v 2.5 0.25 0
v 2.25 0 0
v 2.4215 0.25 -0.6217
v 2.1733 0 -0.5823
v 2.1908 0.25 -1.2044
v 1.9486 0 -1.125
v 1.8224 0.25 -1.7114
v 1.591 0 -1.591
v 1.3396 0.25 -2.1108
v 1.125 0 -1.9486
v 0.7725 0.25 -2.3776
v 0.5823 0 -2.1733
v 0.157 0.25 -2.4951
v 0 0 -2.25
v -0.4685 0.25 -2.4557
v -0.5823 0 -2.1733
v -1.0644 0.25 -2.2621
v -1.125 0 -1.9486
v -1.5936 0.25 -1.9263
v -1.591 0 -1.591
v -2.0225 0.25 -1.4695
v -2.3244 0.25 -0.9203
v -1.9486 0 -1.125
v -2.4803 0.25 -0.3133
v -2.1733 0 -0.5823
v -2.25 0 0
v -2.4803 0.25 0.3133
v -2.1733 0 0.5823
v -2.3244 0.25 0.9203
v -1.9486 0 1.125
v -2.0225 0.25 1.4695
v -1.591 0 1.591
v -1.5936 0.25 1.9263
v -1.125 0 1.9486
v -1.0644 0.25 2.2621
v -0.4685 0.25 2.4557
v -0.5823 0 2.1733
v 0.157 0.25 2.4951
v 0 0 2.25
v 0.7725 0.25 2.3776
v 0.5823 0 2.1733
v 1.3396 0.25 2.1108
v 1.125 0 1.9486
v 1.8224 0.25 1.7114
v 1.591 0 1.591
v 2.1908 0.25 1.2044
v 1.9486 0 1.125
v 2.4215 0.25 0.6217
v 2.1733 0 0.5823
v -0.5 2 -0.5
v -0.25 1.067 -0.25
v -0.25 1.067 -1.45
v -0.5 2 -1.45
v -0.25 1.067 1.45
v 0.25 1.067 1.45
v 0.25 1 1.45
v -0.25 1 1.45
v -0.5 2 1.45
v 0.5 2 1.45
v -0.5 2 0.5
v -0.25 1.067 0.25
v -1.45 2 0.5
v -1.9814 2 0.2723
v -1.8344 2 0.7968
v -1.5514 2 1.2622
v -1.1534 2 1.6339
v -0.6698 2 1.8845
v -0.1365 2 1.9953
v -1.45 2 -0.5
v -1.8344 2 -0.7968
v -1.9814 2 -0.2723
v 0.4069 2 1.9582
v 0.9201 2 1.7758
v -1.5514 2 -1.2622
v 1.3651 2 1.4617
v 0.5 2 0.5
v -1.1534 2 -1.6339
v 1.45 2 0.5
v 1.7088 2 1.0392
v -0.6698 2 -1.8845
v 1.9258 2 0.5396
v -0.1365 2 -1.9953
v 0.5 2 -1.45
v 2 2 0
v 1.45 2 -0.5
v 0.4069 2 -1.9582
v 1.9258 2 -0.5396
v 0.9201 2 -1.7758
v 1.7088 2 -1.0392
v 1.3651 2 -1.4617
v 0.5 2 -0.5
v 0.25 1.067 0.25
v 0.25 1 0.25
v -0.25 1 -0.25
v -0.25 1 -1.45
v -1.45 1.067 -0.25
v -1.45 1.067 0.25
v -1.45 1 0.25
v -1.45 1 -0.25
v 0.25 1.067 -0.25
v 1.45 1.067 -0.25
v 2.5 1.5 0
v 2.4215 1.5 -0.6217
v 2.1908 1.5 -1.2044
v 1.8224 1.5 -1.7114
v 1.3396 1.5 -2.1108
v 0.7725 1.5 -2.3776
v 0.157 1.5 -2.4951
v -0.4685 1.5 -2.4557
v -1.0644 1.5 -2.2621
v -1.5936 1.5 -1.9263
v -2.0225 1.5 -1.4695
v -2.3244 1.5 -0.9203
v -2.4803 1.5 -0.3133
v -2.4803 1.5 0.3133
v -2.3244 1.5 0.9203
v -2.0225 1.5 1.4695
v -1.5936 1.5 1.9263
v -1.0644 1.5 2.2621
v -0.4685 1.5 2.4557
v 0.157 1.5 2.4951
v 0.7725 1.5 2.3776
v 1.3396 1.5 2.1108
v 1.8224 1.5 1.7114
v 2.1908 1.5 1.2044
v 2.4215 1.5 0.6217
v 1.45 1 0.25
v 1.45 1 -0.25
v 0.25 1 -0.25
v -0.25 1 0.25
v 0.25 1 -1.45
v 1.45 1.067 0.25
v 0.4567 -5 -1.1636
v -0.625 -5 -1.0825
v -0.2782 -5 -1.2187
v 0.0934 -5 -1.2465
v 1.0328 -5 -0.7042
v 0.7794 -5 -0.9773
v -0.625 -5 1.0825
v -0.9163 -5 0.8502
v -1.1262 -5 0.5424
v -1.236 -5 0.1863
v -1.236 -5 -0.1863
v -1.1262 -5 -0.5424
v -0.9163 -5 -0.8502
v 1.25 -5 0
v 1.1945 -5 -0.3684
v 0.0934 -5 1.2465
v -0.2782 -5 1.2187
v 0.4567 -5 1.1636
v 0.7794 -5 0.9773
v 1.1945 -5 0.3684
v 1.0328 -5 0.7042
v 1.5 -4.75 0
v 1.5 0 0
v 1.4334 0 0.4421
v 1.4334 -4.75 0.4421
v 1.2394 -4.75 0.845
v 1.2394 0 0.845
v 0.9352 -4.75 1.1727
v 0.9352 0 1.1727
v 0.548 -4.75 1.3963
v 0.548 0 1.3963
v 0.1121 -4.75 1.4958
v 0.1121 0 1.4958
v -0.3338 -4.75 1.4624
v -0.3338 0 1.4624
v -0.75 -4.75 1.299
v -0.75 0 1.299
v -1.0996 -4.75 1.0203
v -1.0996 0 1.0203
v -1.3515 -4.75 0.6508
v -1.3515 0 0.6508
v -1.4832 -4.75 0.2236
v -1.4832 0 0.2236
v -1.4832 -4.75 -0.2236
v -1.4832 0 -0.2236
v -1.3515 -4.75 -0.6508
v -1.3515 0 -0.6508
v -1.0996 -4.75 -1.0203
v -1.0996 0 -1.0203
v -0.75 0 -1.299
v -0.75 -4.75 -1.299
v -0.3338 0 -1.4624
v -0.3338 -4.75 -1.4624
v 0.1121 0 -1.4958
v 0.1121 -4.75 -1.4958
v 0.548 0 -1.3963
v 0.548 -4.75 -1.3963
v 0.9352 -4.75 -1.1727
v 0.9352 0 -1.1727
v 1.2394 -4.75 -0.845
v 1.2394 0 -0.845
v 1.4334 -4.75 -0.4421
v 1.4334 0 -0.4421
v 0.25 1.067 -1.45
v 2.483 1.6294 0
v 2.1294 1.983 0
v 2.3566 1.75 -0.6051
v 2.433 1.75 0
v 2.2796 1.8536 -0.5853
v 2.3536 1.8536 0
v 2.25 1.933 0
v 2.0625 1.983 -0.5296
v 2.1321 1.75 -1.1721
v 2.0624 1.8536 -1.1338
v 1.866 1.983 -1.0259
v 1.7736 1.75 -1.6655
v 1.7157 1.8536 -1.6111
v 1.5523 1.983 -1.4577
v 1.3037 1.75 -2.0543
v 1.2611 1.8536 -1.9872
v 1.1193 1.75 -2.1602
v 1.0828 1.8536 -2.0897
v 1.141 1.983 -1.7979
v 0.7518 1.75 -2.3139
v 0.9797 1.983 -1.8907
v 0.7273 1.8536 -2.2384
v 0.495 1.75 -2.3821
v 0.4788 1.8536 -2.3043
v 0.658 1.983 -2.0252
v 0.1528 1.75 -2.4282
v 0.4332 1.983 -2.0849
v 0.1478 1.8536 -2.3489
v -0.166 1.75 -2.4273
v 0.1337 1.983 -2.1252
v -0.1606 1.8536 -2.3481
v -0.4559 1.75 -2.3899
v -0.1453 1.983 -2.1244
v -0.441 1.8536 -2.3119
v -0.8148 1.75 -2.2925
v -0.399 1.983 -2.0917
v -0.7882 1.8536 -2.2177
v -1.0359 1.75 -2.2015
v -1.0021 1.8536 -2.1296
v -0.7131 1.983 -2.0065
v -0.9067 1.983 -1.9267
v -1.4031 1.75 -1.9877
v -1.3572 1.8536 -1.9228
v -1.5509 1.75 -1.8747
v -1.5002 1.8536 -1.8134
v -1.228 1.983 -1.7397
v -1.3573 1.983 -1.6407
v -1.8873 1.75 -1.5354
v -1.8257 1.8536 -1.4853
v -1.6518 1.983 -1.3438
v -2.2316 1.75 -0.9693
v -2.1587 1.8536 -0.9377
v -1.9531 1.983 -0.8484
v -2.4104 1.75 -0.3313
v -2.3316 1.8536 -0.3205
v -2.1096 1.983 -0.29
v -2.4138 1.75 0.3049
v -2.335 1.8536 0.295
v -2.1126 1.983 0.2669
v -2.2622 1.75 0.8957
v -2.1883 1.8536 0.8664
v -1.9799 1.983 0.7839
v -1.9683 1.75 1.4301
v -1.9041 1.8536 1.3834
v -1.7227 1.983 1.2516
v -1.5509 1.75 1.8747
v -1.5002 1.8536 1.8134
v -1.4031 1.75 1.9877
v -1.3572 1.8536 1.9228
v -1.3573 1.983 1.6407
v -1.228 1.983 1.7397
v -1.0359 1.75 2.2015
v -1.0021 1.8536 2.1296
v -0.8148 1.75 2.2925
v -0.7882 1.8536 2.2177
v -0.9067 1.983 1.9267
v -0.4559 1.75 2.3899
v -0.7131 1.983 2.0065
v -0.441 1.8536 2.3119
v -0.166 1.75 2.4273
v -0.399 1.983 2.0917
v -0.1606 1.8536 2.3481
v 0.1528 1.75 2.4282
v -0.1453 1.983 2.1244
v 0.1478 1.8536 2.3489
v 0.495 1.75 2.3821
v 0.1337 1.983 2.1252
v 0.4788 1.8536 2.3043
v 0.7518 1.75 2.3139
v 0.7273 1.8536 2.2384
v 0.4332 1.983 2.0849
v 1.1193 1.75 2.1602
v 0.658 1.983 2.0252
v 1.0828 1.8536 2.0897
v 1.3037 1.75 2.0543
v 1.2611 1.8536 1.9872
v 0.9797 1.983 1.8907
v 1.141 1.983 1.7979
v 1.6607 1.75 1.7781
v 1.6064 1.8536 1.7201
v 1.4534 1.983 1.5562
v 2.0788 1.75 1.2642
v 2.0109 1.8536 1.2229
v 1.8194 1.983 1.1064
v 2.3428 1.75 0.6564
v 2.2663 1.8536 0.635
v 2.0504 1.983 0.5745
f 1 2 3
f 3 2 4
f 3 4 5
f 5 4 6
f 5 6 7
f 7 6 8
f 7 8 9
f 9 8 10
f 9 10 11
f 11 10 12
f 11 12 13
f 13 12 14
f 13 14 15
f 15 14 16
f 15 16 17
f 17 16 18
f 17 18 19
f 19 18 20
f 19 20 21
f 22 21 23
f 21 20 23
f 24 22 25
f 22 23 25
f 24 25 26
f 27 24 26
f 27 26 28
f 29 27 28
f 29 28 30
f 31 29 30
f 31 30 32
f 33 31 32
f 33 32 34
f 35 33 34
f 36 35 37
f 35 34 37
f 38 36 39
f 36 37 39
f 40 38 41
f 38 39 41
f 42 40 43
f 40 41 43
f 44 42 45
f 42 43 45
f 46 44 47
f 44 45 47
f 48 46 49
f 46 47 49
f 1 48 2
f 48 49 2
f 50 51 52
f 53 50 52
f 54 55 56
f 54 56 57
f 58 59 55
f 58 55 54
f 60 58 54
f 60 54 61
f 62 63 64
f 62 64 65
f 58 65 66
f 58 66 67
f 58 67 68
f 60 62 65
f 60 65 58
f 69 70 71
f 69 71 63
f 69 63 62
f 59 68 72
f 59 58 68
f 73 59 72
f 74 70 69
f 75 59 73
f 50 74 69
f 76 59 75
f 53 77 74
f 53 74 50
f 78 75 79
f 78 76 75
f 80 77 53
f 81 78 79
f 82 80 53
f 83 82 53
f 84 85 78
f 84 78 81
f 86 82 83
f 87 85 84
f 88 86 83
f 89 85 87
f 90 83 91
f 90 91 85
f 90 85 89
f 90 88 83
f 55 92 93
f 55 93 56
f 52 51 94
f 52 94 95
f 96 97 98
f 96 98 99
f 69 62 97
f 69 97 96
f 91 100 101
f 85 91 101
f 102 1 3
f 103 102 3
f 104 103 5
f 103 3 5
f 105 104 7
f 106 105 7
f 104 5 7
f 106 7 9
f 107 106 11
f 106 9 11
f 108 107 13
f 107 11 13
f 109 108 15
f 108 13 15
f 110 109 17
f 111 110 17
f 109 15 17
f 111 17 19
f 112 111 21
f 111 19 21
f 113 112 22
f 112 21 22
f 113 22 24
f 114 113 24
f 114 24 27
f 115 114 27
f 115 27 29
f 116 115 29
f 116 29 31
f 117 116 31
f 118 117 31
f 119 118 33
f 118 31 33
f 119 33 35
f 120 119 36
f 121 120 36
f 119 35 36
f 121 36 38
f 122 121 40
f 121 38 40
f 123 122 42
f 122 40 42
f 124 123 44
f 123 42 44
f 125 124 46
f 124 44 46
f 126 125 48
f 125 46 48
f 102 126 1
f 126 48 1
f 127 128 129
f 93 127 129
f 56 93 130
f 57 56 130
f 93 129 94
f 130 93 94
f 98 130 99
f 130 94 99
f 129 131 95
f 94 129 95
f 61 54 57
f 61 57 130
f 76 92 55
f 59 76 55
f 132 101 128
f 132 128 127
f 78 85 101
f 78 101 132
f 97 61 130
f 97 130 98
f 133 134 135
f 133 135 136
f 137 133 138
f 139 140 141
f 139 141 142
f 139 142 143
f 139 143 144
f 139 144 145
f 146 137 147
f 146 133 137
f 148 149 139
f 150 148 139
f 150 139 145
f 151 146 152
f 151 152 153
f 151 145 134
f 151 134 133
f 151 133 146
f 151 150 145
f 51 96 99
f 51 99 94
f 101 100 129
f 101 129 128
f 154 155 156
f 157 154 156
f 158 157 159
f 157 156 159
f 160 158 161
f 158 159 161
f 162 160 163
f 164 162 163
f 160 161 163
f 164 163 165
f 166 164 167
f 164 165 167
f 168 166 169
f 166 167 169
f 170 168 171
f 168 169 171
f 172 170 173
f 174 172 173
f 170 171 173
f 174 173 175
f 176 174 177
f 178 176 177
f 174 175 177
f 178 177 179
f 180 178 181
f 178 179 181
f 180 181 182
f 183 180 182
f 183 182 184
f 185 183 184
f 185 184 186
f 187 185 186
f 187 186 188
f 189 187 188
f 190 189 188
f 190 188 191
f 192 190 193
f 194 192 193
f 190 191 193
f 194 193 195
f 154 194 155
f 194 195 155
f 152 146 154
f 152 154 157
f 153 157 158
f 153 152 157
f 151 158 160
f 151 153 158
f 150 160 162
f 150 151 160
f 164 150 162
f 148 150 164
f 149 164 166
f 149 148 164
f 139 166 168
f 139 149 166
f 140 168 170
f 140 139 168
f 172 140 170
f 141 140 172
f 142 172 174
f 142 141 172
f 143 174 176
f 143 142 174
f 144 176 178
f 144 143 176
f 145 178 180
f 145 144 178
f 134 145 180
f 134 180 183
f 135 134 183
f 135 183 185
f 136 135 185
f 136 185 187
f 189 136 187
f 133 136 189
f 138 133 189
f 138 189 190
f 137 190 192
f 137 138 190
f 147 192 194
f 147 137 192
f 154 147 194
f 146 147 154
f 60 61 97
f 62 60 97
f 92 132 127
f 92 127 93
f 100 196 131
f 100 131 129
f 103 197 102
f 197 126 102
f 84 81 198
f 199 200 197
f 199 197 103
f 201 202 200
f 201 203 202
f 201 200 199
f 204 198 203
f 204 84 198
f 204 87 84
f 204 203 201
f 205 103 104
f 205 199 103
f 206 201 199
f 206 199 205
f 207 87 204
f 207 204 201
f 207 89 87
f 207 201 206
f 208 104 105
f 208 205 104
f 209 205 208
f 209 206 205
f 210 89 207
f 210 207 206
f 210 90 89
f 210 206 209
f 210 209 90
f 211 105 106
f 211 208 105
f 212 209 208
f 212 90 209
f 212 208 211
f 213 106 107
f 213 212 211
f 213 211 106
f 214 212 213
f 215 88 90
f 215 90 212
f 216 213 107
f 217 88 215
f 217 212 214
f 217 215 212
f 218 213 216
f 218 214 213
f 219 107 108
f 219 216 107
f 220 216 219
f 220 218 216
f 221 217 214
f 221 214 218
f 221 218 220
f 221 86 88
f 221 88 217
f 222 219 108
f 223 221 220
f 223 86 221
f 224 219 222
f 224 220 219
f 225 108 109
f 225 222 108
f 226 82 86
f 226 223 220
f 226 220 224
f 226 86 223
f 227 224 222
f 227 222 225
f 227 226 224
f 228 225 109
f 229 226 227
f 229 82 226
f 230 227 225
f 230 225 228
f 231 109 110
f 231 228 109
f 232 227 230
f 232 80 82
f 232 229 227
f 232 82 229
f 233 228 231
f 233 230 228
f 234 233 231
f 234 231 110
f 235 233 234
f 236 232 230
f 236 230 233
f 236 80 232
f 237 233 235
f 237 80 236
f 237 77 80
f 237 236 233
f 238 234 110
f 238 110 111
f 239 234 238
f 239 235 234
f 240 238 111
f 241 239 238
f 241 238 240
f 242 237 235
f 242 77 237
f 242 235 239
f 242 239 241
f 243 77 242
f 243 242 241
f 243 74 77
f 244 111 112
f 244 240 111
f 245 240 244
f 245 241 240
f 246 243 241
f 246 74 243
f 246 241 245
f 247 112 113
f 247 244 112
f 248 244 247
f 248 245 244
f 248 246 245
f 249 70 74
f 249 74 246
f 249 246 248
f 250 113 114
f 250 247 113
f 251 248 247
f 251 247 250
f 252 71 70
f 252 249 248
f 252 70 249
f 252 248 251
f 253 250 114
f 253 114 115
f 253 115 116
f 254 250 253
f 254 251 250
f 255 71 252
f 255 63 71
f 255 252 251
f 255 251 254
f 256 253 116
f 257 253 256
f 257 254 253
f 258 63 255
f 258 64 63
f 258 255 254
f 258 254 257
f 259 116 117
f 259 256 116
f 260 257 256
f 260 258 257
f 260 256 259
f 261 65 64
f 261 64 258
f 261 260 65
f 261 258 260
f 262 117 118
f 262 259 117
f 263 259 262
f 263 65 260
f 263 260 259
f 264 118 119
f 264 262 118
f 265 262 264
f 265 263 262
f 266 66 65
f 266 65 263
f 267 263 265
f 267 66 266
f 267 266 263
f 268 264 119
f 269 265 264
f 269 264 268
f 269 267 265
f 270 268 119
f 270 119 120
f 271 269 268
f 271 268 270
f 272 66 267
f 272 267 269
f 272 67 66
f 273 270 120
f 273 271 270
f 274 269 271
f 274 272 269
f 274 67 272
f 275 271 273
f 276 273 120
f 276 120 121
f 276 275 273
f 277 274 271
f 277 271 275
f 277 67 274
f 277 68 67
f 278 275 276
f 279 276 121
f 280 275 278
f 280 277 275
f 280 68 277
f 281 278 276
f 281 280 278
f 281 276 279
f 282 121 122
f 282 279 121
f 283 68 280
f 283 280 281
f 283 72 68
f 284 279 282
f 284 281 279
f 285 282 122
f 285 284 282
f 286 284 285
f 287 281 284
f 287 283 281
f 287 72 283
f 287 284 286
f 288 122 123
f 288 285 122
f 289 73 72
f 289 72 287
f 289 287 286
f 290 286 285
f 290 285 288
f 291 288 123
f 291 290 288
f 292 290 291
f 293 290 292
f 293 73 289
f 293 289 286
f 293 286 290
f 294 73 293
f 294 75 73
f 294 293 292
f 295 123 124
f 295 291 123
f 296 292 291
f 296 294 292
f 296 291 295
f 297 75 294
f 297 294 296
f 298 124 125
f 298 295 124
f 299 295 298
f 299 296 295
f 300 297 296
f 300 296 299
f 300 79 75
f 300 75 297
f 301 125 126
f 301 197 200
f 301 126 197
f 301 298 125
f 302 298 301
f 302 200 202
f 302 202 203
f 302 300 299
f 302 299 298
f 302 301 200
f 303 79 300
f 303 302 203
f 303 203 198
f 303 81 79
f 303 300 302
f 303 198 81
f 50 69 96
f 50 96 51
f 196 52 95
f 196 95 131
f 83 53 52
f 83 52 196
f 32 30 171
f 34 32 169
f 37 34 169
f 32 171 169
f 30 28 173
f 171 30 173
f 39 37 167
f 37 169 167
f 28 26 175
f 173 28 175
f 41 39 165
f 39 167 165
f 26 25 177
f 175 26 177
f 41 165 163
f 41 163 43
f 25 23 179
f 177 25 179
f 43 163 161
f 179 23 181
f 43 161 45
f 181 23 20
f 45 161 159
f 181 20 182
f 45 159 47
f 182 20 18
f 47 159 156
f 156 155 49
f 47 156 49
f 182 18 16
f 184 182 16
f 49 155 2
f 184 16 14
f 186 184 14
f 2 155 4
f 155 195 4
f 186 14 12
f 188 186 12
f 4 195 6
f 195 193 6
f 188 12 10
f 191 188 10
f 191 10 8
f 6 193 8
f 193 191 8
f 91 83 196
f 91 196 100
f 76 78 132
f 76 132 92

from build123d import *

# Parameters (mm, degrees)
CROQUIS1_R              = 2.5
SALIENTE_EXTRUIR1_DEPTH = 2
CROQUIS2_R              = 1.5
SALIENTE_EXTRUIR2_DEPTH = 5
CHAFL_N1_SIZE           = 0.25
REDONDEO1_R             = 0.5
CORTAR_EXTRUIR1_DEPTH   = 1
CHAFL_N2_SIZE           = 0.25
CHAFL_N2_SIZE2          = 0.933012702


with BuildPart() as part:
    # Croquis1 → Saliente-Extruir1 (new body)
    with BuildSketch(Plane(origin=(0, 0, 0), x_dir=(1, 0, 0), z_dir=(0, 1, 0))):
        Circle(CROQUIS1_R)
    extrude(amount=SALIENTE_EXTRUIR1_DEPTH)

    # Croquis2 → Saliente-Extruir2 (add)
    with BuildSketch(Plane.XZ):
        Circle(CROQUIS2_R)
    extrude(amount=SALIENTE_EXTRUIR2_DEPTH)

    # Chaflán1
    chafl_n1_edges = [part.edges().sort_by_distance(p)[0] for p in [
        (-2.5, 0, 0),
        (-1.5, -5, 0),
    ]]
    chamfer(chafl_n1_edges, length=CHAFL_N1_SIZE)

    # Redondeo1
    redondeo1_edges = [part.edges().sort_by_distance(p)[0] for p in [
        (-2.5, 2, 0),
    ]]
    fillet(redondeo1_edges, radius=REDONDEO1_R)

    # Croquis3 → Cortar-Extruir1 (cut)
    with BuildSketch(Plane(origin=(0, 2, 0), x_dir=(1, 0, 0), z_dir=(0, 1, 0))):
        Polygon((0.25, 0.25), (1.45, 0.25), (1.45, -0.25), (0.25, -0.25), (0.25, -1.45), (-0.25, -1.45), (-0.25, -0.25), (-1.45, -0.25), (-1.45, 0.25), (-0.25, 0.25), (-0.25, 1.45), (0.25, 1.45), align=None)
    extrude(amount=-CORTAR_EXTRUIR1_DEPTH, mode=Mode.SUBTRACT)

    # Chaflán2
    chafl_n2_edges = [part.edges().sort_by_distance(p)[0] for p in [
        (-0.25, 2, -0.85),
        (-0.85, 2, -0.25),
        (-0.85, 2, 0.25),
        (-0.25, 2, 0.85),
        (0.25, 2, 0.85),
        (0.85, 2, 0.25),
        (0.85, 2, -0.25),
        (0.25, 2, -0.85),
    ]]
    chafl_n2_side = [part.faces().sort_by_distance(p)[0] for p in [
        (-1.943431458, 2, 0),
    ]]
    chamfer(chafl_n2_edges, length=CHAFL_N2_SIZE, length2=CHAFL_N2_SIZE2, reference=chafl_n2_side[0])


solid = part.part
